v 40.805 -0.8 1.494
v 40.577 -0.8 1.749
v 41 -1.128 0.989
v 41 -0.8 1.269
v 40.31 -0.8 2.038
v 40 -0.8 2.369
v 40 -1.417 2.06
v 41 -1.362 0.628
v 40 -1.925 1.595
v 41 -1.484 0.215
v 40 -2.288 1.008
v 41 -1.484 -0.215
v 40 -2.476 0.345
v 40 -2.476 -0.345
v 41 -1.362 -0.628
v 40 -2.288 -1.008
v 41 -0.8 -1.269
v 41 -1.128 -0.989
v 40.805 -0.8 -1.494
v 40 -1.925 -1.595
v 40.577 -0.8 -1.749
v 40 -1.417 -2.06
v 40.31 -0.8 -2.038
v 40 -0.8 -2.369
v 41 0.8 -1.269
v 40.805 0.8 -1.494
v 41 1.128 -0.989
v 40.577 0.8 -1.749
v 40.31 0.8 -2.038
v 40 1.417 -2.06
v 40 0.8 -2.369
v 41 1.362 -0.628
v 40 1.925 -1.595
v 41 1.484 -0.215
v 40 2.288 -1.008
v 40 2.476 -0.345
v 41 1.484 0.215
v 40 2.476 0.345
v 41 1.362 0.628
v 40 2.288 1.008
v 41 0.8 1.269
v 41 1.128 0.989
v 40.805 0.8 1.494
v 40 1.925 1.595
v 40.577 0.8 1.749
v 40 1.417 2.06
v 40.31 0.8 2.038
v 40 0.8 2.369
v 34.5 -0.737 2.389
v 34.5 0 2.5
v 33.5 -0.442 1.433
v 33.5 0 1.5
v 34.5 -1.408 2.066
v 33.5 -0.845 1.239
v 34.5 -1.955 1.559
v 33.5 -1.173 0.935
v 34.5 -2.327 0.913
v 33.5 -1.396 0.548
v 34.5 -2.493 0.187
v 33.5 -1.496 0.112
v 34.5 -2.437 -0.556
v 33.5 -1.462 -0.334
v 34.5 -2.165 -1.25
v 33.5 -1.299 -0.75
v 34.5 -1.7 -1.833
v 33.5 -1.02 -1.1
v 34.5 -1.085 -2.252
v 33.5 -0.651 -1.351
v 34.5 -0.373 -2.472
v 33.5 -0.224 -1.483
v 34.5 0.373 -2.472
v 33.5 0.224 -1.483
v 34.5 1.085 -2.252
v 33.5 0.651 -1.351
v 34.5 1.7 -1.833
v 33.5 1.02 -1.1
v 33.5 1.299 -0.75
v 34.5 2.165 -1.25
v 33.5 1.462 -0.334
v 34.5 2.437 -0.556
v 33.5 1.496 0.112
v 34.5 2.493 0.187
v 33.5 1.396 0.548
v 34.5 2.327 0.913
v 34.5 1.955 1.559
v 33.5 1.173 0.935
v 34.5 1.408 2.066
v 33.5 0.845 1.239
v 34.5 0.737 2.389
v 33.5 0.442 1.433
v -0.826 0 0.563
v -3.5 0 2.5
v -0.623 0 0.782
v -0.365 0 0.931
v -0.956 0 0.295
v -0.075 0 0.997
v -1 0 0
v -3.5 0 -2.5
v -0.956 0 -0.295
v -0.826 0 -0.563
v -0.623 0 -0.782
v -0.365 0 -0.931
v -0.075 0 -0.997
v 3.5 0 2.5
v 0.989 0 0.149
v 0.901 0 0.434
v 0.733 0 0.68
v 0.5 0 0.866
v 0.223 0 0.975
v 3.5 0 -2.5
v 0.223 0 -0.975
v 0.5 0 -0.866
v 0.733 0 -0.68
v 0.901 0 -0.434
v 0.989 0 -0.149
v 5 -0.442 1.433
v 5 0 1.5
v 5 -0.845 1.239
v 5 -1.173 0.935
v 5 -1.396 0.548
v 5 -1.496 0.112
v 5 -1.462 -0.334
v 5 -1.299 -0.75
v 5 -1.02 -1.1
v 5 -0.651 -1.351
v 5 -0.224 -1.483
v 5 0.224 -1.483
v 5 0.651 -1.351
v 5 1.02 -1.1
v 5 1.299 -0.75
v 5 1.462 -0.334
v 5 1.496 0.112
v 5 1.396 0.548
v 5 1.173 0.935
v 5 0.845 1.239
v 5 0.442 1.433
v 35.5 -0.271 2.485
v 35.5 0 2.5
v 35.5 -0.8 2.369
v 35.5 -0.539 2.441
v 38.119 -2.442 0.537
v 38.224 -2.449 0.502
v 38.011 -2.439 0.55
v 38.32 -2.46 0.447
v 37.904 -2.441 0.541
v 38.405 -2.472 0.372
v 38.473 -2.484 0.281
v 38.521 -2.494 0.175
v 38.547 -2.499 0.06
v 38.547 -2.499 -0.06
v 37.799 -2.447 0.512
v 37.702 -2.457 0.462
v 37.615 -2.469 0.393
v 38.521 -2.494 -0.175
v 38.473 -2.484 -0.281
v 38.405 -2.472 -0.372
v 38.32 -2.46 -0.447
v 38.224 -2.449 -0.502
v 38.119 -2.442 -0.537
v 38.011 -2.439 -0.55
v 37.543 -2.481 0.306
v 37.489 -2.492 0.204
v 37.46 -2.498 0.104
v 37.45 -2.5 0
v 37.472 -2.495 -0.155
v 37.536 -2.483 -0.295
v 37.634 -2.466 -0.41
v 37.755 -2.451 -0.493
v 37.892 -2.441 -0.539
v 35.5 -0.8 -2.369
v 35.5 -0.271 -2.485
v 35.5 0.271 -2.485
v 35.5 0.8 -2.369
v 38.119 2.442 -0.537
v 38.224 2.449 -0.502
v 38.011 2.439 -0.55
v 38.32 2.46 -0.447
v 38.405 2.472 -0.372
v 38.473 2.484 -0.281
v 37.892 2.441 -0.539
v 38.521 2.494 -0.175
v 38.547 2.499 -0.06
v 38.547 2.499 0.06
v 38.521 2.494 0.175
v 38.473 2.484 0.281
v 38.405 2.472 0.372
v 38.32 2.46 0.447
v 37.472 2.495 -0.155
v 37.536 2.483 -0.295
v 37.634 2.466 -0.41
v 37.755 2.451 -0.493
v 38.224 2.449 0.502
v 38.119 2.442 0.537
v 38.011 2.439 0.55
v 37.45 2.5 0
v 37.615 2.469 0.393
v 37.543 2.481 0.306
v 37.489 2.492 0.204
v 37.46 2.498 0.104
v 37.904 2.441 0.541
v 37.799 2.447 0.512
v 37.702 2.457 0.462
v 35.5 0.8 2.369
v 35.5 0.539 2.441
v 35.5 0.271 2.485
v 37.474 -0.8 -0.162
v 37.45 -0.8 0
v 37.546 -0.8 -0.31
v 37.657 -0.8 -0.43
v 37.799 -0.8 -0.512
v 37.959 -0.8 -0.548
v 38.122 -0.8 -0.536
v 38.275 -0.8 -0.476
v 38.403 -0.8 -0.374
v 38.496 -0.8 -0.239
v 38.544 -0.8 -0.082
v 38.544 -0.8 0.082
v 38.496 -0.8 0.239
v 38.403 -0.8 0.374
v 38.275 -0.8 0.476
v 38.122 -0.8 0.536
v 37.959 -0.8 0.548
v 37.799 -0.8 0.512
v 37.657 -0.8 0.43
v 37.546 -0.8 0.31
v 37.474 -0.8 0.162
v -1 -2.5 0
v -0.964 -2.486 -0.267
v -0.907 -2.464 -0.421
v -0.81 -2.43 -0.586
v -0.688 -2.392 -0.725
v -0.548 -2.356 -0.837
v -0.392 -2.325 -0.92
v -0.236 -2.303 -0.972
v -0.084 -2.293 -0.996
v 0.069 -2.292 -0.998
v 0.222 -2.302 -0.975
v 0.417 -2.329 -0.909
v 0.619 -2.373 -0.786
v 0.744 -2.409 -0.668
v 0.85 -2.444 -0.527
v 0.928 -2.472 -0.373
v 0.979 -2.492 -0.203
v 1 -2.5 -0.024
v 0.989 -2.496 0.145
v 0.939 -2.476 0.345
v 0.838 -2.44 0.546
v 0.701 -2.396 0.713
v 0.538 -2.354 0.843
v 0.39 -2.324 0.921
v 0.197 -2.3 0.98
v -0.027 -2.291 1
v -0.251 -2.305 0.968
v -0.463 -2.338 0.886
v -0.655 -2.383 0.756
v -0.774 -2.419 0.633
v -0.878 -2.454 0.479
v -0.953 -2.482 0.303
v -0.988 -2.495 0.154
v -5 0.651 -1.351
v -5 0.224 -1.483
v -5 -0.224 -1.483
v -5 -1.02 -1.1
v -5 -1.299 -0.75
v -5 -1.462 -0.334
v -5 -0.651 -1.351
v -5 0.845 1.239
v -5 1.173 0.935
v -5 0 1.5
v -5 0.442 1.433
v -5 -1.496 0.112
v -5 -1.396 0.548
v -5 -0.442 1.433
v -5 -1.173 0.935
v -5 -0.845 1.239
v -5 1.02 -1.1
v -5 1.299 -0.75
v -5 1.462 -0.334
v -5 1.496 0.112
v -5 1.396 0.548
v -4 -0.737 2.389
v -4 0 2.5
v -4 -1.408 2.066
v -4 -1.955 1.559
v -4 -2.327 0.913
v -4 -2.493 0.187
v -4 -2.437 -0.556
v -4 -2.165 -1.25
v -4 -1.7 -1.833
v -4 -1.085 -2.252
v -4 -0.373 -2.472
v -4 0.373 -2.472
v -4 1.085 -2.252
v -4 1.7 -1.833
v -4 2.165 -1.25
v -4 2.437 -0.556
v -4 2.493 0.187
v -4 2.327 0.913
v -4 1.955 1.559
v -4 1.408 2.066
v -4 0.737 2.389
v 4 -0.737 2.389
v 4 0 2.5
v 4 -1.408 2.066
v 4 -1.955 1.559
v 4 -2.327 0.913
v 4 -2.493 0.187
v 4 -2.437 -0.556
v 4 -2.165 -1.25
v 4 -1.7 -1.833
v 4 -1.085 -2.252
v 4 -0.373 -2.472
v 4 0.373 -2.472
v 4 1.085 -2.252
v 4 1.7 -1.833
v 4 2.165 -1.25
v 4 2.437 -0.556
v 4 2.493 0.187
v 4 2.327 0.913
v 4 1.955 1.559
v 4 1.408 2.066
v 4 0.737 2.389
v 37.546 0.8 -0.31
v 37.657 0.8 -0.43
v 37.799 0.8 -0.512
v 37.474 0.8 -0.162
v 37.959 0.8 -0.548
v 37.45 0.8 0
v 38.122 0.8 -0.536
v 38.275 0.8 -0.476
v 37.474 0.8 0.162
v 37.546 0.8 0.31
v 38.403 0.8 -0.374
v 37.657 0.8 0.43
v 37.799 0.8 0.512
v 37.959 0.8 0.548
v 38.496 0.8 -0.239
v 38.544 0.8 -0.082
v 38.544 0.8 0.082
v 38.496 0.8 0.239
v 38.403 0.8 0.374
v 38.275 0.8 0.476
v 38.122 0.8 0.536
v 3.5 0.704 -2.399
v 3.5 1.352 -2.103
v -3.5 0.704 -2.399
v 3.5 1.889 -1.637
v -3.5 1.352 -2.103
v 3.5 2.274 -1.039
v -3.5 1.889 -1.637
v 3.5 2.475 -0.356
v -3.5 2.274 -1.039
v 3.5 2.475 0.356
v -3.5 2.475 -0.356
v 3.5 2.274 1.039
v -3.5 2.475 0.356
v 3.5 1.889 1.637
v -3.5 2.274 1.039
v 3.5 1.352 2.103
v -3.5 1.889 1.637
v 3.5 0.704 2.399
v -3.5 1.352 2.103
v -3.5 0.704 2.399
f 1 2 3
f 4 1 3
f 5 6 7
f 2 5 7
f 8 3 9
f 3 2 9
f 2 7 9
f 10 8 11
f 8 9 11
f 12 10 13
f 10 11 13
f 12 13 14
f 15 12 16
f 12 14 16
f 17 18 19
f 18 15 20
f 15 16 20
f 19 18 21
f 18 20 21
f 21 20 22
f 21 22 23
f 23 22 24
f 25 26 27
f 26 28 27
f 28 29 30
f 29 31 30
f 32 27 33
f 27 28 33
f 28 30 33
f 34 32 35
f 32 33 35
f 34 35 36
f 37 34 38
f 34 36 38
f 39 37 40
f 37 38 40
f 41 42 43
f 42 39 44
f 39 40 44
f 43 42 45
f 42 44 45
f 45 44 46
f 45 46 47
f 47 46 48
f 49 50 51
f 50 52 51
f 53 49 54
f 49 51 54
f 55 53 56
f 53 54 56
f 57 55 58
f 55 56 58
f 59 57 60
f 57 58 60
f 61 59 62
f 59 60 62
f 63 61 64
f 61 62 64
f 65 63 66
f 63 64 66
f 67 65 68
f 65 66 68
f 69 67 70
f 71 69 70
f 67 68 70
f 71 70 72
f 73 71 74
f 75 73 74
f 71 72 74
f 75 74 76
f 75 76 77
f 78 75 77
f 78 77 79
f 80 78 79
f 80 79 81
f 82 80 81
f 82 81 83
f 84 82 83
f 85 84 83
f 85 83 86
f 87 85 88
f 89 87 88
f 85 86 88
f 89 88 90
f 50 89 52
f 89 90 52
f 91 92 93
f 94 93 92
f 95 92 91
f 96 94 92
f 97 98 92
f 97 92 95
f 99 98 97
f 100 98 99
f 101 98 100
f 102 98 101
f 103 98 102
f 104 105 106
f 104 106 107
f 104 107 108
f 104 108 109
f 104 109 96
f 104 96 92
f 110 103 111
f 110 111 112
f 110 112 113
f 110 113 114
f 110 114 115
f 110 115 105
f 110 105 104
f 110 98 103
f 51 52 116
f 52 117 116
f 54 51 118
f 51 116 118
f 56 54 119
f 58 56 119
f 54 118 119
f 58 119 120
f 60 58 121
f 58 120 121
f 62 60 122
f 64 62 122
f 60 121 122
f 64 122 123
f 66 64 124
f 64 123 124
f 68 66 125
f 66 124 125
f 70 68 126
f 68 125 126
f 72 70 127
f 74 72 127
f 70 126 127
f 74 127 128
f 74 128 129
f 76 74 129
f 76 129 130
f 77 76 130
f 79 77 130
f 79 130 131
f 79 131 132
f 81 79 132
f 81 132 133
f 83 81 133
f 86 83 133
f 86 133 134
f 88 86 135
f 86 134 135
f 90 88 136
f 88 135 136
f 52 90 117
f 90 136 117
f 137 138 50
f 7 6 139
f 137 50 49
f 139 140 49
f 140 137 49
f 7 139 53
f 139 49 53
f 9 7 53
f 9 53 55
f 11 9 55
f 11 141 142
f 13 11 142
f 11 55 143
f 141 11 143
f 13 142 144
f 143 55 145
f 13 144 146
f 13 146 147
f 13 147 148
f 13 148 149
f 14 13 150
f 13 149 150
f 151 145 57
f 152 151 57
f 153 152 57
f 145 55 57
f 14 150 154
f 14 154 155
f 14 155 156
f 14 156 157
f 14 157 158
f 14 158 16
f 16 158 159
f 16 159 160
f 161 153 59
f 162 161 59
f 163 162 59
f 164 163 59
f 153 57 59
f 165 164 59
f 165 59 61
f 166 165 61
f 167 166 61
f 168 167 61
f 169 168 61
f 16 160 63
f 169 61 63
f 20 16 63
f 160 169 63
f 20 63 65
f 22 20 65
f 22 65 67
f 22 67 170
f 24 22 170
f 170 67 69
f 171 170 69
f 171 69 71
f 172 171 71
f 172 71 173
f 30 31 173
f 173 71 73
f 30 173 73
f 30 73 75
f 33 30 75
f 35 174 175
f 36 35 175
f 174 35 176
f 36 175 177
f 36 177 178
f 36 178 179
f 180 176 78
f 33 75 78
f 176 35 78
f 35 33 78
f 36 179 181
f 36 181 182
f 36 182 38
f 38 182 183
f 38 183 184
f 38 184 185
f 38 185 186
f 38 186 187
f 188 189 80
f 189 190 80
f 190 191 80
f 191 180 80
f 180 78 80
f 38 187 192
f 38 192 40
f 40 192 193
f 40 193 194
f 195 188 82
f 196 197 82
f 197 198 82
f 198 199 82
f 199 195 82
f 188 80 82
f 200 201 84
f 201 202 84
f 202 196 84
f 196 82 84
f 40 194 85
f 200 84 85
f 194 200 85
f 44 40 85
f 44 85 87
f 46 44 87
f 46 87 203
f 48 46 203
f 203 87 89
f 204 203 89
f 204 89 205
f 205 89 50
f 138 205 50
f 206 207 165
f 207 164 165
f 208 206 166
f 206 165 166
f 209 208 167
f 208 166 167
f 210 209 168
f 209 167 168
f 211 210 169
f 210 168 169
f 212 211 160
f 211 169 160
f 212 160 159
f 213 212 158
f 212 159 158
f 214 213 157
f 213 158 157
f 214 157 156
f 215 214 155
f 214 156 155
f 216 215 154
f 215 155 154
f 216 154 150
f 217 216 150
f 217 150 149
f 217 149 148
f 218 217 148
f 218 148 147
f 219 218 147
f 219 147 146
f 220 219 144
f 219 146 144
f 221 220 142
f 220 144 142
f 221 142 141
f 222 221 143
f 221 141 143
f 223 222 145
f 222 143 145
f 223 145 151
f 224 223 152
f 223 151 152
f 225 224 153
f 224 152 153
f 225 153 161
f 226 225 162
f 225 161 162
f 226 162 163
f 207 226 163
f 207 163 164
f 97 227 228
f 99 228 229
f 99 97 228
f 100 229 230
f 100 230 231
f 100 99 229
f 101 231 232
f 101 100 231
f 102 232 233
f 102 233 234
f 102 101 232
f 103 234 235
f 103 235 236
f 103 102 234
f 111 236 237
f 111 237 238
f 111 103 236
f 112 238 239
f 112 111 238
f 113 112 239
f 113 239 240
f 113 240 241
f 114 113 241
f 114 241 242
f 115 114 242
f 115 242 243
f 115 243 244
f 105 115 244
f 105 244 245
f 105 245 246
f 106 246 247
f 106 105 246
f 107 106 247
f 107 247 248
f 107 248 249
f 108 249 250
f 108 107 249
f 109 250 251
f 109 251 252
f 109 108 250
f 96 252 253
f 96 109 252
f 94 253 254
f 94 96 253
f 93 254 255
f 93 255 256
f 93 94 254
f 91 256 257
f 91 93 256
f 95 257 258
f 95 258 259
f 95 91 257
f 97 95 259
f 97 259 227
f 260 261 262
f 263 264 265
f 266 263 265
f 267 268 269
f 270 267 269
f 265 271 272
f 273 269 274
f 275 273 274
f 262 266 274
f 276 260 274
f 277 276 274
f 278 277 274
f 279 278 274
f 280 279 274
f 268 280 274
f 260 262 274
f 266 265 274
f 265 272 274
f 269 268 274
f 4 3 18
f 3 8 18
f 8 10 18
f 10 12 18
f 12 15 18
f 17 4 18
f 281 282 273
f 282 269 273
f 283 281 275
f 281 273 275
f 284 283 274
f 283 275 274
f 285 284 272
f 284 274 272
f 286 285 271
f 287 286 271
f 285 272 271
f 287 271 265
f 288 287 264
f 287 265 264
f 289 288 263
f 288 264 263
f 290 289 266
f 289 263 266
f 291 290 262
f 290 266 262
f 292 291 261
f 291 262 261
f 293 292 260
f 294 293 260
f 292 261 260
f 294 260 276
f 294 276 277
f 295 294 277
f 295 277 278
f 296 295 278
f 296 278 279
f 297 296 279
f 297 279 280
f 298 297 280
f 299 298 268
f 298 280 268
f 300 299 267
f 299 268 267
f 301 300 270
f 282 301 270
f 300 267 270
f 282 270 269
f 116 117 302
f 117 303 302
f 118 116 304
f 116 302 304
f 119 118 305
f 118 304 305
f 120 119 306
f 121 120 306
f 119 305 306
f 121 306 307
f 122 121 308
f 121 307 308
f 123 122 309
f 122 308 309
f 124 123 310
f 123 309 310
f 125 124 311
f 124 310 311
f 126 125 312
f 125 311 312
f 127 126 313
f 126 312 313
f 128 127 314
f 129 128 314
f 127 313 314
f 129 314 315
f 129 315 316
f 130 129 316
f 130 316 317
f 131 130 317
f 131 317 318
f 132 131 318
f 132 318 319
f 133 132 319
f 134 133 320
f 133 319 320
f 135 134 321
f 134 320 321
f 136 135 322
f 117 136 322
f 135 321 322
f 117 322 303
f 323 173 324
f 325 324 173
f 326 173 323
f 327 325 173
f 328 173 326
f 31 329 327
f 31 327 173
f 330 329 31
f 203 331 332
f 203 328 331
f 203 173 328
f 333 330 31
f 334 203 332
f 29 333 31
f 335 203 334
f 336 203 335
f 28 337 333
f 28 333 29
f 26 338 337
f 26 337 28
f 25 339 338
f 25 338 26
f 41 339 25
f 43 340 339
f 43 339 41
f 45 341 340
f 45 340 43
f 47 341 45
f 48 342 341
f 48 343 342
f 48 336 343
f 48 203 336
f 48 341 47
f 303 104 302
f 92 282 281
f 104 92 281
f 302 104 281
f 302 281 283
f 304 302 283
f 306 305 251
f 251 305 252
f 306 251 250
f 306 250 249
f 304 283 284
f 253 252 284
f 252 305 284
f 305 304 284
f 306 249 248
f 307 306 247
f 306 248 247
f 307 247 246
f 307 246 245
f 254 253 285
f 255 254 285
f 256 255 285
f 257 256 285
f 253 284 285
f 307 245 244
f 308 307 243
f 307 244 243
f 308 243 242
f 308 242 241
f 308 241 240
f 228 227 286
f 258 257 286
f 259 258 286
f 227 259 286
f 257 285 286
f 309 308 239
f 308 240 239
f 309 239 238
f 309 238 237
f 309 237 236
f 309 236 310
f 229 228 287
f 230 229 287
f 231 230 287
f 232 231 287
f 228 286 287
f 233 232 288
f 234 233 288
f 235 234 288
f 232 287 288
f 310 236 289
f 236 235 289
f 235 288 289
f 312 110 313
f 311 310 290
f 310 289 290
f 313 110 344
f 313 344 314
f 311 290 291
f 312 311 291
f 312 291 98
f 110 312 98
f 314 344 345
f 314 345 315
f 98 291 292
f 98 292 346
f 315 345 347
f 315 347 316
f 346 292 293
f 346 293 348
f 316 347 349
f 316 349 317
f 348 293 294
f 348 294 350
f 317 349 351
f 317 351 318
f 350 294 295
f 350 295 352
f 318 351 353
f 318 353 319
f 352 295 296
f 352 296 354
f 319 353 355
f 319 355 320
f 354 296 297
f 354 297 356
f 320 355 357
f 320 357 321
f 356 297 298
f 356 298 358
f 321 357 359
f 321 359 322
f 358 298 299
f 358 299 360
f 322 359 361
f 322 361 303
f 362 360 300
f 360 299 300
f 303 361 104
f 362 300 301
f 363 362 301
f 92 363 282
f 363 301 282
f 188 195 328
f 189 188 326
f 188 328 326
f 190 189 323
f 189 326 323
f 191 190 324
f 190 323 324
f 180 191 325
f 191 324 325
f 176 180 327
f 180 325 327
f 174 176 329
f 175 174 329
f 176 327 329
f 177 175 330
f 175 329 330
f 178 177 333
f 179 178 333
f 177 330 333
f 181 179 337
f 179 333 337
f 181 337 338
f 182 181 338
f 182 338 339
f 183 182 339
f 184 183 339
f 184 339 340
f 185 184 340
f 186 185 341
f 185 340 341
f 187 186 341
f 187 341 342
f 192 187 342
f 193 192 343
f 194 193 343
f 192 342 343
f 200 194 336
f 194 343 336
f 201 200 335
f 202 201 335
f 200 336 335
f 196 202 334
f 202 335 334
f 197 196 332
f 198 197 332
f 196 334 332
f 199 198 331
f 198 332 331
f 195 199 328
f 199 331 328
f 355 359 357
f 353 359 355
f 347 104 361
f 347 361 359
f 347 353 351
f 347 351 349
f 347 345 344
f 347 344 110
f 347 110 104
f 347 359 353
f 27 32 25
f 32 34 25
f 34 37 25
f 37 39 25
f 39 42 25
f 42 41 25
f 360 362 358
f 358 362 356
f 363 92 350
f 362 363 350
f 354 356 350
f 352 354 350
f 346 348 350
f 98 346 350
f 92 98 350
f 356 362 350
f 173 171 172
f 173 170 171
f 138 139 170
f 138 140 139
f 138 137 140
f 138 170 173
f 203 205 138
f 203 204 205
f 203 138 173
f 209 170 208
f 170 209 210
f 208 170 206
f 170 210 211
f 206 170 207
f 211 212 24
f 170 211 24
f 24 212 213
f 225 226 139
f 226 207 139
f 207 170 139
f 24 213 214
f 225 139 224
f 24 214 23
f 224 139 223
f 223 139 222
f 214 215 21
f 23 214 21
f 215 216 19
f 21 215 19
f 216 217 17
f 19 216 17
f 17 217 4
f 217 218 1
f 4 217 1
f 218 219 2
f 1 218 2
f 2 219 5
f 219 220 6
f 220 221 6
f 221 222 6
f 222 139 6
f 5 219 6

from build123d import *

# Parameters (mm, degrees)
F2_DEPTH = 12.7
F3_W     = 7
F3_H     = 4.492721
F3_W_2   = 5.5
F3_H_2   = 1.6
F4_DEPTH = 12.7


with BuildPart() as f1:
    # F0 (on Front) → F1 (revolve)
    with BuildSketch(Plane.XZ):
        with BuildLine():
            ThreePointArc((-1, 0), (0, 1), (1, 0))
            Line((1, 0), (37.45, 0))
            ThreePointArc((37.45, 0), (38, 0.55), (38.55, 0))
            Line((38.55, 0), (41, 0))
            Line((41, 0), (41, 1.5))
            Line((41, 1.5), (40, 2.5))
            Line((40, 2.5), (34.5, 2.5))
            Line((34.5, 2.5), (33.5, 1.5))
            Line((33.5, 1.5), (5, 1.5))
            Line((5, 1.5), (4, 2.5))
            Line((4, 2.5), (-4, 2.5))
            Line((-4, 2.5), (-5, 1.5))
            Line((-5, 1.5), (-5, 0))
            Line((-5, 0), (-1, 0))
        make_face()
        with BuildLine():
            ThreePointArc((-1, 0), (0, -1), (1, 0))
            Line((1, 0), (-1, 0))
        make_face()
        with BuildLine():
            Line((38.55, 0), (37.45, 0))
            ThreePointArc((37.45, 0), (38, -0.55), (38.55, 0))
        make_face()
    revolve(axis=Axis((18, 0, 0), (1, 0, 0)))

    # F0 (on Front) → F2 (cut, symmetric)
    with BuildSketch(Plane.XZ):
        with BuildLine():
            Line((-1, 0), (1, 0))
            ThreePointArc((1, 0), (0, 1), (-1, 0))
        make_face()
        with BuildLine():
            ThreePointArc((-1, 0), (0, -1), (1, 0))
            Line((1, 0), (-1, 0))
        make_face()
        with BuildLine():
            ThreePointArc((38.55, 0), (38, 0.55), (37.45, 0))
            Line((37.45, 0), (38.55, 0))
        make_face()
        with BuildLine():
            Line((38.55, 0), (37.45, 0))
            ThreePointArc((37.45, 0), (38, -0.55), (38.55, 0))
        make_face()
    extrude(amount=F2_DEPTH, both=True, mode=Mode.SUBTRACT)

    # F3 (on Top) → F4 (cut, symmetric)
    with BuildSketch(Plane.XY):
        with Locations((0, 2.24636)):
            Rectangle(F3_W, F3_H)
        with Locations((38.25, 0)):
            Rectangle(F3_W_2, F3_H_2)
    extrude(amount=F4_DEPTH, both=True, mode=Mode.SUBTRACT)


solid = f1.part
